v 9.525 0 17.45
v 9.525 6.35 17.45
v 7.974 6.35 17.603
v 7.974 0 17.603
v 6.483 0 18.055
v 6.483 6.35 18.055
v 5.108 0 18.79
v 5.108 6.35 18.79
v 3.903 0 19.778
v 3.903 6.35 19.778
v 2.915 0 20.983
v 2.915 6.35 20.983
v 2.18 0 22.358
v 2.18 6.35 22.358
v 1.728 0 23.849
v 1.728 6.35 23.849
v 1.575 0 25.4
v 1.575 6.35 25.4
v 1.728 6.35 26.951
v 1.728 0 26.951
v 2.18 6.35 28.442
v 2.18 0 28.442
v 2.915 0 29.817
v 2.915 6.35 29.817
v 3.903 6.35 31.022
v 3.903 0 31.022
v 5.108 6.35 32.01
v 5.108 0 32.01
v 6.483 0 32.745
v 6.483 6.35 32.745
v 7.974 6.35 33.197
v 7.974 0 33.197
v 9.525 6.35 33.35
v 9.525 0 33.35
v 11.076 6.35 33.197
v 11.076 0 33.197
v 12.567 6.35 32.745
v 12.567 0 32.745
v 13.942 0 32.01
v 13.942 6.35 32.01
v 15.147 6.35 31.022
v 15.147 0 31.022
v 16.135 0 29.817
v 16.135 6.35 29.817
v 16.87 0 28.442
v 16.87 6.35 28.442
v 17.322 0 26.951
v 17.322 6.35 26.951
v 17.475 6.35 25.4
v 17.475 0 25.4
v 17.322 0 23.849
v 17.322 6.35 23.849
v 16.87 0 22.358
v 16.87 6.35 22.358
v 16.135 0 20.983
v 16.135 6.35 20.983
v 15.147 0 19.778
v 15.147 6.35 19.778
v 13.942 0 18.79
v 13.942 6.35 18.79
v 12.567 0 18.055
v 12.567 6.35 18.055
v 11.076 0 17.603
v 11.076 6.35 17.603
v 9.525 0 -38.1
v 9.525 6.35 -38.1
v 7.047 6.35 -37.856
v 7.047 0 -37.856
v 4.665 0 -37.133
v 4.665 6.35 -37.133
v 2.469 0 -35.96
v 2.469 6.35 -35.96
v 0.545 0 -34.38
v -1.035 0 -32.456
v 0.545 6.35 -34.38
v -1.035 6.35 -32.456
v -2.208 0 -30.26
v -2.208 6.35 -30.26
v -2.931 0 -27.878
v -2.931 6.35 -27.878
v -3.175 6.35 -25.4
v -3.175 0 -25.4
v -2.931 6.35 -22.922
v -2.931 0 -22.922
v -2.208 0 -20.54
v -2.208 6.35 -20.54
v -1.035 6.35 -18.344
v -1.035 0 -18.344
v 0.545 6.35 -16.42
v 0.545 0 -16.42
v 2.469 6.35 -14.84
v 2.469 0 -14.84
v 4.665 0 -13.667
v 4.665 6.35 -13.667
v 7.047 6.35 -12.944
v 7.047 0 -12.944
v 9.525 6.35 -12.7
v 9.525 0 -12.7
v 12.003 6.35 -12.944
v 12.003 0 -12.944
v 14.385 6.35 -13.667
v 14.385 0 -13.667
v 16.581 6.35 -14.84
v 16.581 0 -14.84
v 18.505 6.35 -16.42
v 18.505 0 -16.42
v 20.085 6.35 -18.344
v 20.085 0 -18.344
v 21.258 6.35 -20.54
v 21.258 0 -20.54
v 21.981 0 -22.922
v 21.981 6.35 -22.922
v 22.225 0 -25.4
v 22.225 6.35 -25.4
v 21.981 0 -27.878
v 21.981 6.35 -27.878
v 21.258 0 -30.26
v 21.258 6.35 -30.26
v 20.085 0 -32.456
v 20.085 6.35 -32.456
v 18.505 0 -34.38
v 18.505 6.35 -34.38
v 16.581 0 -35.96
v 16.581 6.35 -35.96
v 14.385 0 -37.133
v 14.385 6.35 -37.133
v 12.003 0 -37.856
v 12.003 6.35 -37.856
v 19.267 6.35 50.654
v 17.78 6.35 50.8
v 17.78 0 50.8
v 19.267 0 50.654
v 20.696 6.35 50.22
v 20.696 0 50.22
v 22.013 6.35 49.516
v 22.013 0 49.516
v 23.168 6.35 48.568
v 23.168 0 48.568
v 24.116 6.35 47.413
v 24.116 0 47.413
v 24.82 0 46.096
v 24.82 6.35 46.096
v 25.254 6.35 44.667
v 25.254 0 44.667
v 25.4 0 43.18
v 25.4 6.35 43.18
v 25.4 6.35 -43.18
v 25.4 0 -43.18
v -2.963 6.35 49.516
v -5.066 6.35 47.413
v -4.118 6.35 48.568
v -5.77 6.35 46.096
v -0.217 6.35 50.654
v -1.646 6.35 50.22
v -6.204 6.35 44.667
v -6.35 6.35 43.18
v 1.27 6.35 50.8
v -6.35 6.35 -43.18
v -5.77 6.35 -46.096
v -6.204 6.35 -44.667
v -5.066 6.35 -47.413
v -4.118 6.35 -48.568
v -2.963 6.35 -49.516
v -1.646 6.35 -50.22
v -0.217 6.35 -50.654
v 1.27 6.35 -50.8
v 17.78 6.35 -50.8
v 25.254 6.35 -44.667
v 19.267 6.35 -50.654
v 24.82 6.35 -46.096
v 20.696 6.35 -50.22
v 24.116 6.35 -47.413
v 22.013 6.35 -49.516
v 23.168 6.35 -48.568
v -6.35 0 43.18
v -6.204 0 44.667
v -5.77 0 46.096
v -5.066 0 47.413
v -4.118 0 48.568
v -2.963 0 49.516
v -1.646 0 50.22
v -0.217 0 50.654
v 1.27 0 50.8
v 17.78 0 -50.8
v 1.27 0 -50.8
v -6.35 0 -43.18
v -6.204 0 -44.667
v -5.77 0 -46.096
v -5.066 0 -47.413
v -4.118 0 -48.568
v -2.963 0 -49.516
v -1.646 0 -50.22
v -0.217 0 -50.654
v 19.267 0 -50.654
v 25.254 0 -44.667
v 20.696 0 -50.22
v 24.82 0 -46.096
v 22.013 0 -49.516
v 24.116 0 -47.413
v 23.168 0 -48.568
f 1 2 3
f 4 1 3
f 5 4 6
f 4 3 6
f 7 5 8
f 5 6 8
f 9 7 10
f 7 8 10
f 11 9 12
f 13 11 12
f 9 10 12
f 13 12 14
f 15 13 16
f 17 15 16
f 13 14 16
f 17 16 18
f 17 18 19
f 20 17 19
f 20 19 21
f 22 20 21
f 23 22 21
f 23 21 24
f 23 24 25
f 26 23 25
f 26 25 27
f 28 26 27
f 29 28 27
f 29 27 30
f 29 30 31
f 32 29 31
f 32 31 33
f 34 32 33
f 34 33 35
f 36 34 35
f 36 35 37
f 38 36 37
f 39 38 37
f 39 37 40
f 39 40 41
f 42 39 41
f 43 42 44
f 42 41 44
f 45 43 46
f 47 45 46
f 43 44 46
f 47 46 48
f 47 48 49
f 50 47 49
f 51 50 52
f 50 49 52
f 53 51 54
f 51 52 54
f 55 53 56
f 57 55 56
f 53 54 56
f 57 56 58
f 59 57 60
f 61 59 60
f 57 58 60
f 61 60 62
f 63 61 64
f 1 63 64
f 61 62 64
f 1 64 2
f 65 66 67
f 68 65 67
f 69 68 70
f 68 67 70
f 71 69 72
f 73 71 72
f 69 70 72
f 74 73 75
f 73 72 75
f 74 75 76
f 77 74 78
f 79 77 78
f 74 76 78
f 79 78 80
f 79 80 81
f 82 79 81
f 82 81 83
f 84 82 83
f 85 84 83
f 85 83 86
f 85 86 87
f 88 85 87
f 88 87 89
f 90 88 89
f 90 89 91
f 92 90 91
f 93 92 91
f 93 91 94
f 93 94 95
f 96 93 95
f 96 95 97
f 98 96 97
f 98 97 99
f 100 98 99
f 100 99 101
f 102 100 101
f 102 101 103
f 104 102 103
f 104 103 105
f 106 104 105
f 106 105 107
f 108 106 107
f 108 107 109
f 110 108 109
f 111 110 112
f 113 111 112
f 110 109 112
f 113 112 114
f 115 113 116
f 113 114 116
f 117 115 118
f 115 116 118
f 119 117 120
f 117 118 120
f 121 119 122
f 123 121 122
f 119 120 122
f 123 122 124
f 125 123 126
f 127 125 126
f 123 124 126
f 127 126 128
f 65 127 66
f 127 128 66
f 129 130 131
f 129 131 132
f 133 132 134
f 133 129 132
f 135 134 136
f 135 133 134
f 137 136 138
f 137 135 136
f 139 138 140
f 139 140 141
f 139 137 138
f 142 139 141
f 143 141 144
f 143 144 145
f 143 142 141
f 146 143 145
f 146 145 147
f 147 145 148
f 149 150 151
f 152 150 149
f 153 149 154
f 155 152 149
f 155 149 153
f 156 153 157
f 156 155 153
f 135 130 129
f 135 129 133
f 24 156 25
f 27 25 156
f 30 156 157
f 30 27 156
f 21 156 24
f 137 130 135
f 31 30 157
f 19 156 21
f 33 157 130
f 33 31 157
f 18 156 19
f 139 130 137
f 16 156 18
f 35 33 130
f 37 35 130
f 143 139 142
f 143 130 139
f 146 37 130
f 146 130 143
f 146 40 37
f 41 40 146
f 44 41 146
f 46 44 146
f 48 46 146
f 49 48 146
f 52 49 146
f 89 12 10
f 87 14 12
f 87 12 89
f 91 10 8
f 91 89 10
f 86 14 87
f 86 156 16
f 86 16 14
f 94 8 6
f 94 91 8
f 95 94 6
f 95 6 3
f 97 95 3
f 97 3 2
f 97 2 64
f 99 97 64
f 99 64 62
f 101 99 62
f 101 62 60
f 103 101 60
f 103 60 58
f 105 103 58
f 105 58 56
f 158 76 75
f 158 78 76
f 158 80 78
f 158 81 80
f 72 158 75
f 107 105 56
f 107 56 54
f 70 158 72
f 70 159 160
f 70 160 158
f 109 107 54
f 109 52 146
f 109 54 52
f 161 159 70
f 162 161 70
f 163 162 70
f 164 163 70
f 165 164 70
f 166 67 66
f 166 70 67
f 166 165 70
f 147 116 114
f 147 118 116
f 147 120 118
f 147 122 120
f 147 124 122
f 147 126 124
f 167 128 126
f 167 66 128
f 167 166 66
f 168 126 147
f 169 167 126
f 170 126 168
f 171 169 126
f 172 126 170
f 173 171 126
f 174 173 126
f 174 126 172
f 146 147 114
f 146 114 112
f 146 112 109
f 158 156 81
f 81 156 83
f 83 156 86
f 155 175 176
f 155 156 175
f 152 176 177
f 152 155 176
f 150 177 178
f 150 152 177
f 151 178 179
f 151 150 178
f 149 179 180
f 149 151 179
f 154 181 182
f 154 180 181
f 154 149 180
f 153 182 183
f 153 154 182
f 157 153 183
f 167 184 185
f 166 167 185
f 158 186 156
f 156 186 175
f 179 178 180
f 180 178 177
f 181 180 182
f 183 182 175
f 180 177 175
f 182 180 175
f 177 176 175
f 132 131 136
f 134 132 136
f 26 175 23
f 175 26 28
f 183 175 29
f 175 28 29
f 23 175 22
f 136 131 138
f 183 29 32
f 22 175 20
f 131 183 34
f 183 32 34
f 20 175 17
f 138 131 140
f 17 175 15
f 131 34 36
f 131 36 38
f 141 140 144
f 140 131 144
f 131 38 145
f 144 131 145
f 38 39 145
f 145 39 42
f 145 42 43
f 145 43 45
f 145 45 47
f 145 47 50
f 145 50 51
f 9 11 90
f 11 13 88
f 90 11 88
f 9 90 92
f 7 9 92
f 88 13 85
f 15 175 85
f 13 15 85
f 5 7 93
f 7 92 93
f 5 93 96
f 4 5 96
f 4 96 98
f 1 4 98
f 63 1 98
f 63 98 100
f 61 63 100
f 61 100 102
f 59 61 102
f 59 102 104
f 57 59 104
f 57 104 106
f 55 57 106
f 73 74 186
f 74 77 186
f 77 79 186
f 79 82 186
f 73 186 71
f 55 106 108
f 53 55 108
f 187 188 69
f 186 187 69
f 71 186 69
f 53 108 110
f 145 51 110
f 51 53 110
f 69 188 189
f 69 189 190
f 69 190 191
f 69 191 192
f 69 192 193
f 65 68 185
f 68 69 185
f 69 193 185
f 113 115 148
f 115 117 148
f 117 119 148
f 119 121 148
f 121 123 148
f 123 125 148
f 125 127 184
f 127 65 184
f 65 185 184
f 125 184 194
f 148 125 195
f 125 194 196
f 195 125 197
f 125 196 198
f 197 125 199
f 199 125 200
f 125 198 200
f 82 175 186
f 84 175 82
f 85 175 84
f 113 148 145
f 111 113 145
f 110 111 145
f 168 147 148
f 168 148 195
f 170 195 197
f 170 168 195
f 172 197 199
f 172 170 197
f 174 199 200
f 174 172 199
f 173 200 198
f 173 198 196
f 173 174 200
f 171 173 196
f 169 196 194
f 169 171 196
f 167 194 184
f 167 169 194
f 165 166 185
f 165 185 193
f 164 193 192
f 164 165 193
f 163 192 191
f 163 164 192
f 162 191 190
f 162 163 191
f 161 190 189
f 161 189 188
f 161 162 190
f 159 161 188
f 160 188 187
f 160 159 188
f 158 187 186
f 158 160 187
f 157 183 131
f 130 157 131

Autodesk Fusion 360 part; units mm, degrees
sketch "Sketch1" plane through (0, 0, 0) normal (0, 1, 0) x (1, 0, 0)
  line L0 (-6.35, -50.8) -> (25.4, -50.8)
  line L1 (25.4, -50.8) -> (25.4, 50.8)
  line L2 (25.4, 50.8) -> (-6.35, 50.8)
  line L3 (-6.35, 50.8) -> (-6.35, -50.8)
  dimension "d6" = 31.75
  dimension "d7" = 101.6
extrude "Extrude1" add sketch "Sketch1" along normal blind 6.35
hole "Hole1" at (9.525, 0, 25.4) direction (0, 1, 0) diameter 15.9004 depth 12.7 tip angle 118
hole "Hole2" at (9.525, 0, -25.4) direction (0, 1, 0) diameter 25.4 depth 12.7 tip angle 118
fillet "Fillet1" radius 7.62 1 edges at (25.4, 3.175, 50.8)
fillet "Fillet2" radius 7.62 1 edges at (-6.35, 3.175, 50.8)
fillet "Fillet3" radius 7.62 1 edges at (25.4, 3.175, -50.8)
fillet "Fillet4" radius 7.62 1 edges at (-6.35, 3.175, -50.8)
equation "Fit_Height = 4.00 in"
equation "Fit_Length = 1.25 in"
equation "Fit_Width = 0.25 in"
equation "Hole_D1 = 0.626 in"
equation "Hole_D2 = 1.00 in"
equation "d6 = Fit_Length"
equation "d7 = Fit_Height"
equation "d8 = Fit_Width"
equation "d11 = Hole_D1"
equation "d16 = Hole_D2"
